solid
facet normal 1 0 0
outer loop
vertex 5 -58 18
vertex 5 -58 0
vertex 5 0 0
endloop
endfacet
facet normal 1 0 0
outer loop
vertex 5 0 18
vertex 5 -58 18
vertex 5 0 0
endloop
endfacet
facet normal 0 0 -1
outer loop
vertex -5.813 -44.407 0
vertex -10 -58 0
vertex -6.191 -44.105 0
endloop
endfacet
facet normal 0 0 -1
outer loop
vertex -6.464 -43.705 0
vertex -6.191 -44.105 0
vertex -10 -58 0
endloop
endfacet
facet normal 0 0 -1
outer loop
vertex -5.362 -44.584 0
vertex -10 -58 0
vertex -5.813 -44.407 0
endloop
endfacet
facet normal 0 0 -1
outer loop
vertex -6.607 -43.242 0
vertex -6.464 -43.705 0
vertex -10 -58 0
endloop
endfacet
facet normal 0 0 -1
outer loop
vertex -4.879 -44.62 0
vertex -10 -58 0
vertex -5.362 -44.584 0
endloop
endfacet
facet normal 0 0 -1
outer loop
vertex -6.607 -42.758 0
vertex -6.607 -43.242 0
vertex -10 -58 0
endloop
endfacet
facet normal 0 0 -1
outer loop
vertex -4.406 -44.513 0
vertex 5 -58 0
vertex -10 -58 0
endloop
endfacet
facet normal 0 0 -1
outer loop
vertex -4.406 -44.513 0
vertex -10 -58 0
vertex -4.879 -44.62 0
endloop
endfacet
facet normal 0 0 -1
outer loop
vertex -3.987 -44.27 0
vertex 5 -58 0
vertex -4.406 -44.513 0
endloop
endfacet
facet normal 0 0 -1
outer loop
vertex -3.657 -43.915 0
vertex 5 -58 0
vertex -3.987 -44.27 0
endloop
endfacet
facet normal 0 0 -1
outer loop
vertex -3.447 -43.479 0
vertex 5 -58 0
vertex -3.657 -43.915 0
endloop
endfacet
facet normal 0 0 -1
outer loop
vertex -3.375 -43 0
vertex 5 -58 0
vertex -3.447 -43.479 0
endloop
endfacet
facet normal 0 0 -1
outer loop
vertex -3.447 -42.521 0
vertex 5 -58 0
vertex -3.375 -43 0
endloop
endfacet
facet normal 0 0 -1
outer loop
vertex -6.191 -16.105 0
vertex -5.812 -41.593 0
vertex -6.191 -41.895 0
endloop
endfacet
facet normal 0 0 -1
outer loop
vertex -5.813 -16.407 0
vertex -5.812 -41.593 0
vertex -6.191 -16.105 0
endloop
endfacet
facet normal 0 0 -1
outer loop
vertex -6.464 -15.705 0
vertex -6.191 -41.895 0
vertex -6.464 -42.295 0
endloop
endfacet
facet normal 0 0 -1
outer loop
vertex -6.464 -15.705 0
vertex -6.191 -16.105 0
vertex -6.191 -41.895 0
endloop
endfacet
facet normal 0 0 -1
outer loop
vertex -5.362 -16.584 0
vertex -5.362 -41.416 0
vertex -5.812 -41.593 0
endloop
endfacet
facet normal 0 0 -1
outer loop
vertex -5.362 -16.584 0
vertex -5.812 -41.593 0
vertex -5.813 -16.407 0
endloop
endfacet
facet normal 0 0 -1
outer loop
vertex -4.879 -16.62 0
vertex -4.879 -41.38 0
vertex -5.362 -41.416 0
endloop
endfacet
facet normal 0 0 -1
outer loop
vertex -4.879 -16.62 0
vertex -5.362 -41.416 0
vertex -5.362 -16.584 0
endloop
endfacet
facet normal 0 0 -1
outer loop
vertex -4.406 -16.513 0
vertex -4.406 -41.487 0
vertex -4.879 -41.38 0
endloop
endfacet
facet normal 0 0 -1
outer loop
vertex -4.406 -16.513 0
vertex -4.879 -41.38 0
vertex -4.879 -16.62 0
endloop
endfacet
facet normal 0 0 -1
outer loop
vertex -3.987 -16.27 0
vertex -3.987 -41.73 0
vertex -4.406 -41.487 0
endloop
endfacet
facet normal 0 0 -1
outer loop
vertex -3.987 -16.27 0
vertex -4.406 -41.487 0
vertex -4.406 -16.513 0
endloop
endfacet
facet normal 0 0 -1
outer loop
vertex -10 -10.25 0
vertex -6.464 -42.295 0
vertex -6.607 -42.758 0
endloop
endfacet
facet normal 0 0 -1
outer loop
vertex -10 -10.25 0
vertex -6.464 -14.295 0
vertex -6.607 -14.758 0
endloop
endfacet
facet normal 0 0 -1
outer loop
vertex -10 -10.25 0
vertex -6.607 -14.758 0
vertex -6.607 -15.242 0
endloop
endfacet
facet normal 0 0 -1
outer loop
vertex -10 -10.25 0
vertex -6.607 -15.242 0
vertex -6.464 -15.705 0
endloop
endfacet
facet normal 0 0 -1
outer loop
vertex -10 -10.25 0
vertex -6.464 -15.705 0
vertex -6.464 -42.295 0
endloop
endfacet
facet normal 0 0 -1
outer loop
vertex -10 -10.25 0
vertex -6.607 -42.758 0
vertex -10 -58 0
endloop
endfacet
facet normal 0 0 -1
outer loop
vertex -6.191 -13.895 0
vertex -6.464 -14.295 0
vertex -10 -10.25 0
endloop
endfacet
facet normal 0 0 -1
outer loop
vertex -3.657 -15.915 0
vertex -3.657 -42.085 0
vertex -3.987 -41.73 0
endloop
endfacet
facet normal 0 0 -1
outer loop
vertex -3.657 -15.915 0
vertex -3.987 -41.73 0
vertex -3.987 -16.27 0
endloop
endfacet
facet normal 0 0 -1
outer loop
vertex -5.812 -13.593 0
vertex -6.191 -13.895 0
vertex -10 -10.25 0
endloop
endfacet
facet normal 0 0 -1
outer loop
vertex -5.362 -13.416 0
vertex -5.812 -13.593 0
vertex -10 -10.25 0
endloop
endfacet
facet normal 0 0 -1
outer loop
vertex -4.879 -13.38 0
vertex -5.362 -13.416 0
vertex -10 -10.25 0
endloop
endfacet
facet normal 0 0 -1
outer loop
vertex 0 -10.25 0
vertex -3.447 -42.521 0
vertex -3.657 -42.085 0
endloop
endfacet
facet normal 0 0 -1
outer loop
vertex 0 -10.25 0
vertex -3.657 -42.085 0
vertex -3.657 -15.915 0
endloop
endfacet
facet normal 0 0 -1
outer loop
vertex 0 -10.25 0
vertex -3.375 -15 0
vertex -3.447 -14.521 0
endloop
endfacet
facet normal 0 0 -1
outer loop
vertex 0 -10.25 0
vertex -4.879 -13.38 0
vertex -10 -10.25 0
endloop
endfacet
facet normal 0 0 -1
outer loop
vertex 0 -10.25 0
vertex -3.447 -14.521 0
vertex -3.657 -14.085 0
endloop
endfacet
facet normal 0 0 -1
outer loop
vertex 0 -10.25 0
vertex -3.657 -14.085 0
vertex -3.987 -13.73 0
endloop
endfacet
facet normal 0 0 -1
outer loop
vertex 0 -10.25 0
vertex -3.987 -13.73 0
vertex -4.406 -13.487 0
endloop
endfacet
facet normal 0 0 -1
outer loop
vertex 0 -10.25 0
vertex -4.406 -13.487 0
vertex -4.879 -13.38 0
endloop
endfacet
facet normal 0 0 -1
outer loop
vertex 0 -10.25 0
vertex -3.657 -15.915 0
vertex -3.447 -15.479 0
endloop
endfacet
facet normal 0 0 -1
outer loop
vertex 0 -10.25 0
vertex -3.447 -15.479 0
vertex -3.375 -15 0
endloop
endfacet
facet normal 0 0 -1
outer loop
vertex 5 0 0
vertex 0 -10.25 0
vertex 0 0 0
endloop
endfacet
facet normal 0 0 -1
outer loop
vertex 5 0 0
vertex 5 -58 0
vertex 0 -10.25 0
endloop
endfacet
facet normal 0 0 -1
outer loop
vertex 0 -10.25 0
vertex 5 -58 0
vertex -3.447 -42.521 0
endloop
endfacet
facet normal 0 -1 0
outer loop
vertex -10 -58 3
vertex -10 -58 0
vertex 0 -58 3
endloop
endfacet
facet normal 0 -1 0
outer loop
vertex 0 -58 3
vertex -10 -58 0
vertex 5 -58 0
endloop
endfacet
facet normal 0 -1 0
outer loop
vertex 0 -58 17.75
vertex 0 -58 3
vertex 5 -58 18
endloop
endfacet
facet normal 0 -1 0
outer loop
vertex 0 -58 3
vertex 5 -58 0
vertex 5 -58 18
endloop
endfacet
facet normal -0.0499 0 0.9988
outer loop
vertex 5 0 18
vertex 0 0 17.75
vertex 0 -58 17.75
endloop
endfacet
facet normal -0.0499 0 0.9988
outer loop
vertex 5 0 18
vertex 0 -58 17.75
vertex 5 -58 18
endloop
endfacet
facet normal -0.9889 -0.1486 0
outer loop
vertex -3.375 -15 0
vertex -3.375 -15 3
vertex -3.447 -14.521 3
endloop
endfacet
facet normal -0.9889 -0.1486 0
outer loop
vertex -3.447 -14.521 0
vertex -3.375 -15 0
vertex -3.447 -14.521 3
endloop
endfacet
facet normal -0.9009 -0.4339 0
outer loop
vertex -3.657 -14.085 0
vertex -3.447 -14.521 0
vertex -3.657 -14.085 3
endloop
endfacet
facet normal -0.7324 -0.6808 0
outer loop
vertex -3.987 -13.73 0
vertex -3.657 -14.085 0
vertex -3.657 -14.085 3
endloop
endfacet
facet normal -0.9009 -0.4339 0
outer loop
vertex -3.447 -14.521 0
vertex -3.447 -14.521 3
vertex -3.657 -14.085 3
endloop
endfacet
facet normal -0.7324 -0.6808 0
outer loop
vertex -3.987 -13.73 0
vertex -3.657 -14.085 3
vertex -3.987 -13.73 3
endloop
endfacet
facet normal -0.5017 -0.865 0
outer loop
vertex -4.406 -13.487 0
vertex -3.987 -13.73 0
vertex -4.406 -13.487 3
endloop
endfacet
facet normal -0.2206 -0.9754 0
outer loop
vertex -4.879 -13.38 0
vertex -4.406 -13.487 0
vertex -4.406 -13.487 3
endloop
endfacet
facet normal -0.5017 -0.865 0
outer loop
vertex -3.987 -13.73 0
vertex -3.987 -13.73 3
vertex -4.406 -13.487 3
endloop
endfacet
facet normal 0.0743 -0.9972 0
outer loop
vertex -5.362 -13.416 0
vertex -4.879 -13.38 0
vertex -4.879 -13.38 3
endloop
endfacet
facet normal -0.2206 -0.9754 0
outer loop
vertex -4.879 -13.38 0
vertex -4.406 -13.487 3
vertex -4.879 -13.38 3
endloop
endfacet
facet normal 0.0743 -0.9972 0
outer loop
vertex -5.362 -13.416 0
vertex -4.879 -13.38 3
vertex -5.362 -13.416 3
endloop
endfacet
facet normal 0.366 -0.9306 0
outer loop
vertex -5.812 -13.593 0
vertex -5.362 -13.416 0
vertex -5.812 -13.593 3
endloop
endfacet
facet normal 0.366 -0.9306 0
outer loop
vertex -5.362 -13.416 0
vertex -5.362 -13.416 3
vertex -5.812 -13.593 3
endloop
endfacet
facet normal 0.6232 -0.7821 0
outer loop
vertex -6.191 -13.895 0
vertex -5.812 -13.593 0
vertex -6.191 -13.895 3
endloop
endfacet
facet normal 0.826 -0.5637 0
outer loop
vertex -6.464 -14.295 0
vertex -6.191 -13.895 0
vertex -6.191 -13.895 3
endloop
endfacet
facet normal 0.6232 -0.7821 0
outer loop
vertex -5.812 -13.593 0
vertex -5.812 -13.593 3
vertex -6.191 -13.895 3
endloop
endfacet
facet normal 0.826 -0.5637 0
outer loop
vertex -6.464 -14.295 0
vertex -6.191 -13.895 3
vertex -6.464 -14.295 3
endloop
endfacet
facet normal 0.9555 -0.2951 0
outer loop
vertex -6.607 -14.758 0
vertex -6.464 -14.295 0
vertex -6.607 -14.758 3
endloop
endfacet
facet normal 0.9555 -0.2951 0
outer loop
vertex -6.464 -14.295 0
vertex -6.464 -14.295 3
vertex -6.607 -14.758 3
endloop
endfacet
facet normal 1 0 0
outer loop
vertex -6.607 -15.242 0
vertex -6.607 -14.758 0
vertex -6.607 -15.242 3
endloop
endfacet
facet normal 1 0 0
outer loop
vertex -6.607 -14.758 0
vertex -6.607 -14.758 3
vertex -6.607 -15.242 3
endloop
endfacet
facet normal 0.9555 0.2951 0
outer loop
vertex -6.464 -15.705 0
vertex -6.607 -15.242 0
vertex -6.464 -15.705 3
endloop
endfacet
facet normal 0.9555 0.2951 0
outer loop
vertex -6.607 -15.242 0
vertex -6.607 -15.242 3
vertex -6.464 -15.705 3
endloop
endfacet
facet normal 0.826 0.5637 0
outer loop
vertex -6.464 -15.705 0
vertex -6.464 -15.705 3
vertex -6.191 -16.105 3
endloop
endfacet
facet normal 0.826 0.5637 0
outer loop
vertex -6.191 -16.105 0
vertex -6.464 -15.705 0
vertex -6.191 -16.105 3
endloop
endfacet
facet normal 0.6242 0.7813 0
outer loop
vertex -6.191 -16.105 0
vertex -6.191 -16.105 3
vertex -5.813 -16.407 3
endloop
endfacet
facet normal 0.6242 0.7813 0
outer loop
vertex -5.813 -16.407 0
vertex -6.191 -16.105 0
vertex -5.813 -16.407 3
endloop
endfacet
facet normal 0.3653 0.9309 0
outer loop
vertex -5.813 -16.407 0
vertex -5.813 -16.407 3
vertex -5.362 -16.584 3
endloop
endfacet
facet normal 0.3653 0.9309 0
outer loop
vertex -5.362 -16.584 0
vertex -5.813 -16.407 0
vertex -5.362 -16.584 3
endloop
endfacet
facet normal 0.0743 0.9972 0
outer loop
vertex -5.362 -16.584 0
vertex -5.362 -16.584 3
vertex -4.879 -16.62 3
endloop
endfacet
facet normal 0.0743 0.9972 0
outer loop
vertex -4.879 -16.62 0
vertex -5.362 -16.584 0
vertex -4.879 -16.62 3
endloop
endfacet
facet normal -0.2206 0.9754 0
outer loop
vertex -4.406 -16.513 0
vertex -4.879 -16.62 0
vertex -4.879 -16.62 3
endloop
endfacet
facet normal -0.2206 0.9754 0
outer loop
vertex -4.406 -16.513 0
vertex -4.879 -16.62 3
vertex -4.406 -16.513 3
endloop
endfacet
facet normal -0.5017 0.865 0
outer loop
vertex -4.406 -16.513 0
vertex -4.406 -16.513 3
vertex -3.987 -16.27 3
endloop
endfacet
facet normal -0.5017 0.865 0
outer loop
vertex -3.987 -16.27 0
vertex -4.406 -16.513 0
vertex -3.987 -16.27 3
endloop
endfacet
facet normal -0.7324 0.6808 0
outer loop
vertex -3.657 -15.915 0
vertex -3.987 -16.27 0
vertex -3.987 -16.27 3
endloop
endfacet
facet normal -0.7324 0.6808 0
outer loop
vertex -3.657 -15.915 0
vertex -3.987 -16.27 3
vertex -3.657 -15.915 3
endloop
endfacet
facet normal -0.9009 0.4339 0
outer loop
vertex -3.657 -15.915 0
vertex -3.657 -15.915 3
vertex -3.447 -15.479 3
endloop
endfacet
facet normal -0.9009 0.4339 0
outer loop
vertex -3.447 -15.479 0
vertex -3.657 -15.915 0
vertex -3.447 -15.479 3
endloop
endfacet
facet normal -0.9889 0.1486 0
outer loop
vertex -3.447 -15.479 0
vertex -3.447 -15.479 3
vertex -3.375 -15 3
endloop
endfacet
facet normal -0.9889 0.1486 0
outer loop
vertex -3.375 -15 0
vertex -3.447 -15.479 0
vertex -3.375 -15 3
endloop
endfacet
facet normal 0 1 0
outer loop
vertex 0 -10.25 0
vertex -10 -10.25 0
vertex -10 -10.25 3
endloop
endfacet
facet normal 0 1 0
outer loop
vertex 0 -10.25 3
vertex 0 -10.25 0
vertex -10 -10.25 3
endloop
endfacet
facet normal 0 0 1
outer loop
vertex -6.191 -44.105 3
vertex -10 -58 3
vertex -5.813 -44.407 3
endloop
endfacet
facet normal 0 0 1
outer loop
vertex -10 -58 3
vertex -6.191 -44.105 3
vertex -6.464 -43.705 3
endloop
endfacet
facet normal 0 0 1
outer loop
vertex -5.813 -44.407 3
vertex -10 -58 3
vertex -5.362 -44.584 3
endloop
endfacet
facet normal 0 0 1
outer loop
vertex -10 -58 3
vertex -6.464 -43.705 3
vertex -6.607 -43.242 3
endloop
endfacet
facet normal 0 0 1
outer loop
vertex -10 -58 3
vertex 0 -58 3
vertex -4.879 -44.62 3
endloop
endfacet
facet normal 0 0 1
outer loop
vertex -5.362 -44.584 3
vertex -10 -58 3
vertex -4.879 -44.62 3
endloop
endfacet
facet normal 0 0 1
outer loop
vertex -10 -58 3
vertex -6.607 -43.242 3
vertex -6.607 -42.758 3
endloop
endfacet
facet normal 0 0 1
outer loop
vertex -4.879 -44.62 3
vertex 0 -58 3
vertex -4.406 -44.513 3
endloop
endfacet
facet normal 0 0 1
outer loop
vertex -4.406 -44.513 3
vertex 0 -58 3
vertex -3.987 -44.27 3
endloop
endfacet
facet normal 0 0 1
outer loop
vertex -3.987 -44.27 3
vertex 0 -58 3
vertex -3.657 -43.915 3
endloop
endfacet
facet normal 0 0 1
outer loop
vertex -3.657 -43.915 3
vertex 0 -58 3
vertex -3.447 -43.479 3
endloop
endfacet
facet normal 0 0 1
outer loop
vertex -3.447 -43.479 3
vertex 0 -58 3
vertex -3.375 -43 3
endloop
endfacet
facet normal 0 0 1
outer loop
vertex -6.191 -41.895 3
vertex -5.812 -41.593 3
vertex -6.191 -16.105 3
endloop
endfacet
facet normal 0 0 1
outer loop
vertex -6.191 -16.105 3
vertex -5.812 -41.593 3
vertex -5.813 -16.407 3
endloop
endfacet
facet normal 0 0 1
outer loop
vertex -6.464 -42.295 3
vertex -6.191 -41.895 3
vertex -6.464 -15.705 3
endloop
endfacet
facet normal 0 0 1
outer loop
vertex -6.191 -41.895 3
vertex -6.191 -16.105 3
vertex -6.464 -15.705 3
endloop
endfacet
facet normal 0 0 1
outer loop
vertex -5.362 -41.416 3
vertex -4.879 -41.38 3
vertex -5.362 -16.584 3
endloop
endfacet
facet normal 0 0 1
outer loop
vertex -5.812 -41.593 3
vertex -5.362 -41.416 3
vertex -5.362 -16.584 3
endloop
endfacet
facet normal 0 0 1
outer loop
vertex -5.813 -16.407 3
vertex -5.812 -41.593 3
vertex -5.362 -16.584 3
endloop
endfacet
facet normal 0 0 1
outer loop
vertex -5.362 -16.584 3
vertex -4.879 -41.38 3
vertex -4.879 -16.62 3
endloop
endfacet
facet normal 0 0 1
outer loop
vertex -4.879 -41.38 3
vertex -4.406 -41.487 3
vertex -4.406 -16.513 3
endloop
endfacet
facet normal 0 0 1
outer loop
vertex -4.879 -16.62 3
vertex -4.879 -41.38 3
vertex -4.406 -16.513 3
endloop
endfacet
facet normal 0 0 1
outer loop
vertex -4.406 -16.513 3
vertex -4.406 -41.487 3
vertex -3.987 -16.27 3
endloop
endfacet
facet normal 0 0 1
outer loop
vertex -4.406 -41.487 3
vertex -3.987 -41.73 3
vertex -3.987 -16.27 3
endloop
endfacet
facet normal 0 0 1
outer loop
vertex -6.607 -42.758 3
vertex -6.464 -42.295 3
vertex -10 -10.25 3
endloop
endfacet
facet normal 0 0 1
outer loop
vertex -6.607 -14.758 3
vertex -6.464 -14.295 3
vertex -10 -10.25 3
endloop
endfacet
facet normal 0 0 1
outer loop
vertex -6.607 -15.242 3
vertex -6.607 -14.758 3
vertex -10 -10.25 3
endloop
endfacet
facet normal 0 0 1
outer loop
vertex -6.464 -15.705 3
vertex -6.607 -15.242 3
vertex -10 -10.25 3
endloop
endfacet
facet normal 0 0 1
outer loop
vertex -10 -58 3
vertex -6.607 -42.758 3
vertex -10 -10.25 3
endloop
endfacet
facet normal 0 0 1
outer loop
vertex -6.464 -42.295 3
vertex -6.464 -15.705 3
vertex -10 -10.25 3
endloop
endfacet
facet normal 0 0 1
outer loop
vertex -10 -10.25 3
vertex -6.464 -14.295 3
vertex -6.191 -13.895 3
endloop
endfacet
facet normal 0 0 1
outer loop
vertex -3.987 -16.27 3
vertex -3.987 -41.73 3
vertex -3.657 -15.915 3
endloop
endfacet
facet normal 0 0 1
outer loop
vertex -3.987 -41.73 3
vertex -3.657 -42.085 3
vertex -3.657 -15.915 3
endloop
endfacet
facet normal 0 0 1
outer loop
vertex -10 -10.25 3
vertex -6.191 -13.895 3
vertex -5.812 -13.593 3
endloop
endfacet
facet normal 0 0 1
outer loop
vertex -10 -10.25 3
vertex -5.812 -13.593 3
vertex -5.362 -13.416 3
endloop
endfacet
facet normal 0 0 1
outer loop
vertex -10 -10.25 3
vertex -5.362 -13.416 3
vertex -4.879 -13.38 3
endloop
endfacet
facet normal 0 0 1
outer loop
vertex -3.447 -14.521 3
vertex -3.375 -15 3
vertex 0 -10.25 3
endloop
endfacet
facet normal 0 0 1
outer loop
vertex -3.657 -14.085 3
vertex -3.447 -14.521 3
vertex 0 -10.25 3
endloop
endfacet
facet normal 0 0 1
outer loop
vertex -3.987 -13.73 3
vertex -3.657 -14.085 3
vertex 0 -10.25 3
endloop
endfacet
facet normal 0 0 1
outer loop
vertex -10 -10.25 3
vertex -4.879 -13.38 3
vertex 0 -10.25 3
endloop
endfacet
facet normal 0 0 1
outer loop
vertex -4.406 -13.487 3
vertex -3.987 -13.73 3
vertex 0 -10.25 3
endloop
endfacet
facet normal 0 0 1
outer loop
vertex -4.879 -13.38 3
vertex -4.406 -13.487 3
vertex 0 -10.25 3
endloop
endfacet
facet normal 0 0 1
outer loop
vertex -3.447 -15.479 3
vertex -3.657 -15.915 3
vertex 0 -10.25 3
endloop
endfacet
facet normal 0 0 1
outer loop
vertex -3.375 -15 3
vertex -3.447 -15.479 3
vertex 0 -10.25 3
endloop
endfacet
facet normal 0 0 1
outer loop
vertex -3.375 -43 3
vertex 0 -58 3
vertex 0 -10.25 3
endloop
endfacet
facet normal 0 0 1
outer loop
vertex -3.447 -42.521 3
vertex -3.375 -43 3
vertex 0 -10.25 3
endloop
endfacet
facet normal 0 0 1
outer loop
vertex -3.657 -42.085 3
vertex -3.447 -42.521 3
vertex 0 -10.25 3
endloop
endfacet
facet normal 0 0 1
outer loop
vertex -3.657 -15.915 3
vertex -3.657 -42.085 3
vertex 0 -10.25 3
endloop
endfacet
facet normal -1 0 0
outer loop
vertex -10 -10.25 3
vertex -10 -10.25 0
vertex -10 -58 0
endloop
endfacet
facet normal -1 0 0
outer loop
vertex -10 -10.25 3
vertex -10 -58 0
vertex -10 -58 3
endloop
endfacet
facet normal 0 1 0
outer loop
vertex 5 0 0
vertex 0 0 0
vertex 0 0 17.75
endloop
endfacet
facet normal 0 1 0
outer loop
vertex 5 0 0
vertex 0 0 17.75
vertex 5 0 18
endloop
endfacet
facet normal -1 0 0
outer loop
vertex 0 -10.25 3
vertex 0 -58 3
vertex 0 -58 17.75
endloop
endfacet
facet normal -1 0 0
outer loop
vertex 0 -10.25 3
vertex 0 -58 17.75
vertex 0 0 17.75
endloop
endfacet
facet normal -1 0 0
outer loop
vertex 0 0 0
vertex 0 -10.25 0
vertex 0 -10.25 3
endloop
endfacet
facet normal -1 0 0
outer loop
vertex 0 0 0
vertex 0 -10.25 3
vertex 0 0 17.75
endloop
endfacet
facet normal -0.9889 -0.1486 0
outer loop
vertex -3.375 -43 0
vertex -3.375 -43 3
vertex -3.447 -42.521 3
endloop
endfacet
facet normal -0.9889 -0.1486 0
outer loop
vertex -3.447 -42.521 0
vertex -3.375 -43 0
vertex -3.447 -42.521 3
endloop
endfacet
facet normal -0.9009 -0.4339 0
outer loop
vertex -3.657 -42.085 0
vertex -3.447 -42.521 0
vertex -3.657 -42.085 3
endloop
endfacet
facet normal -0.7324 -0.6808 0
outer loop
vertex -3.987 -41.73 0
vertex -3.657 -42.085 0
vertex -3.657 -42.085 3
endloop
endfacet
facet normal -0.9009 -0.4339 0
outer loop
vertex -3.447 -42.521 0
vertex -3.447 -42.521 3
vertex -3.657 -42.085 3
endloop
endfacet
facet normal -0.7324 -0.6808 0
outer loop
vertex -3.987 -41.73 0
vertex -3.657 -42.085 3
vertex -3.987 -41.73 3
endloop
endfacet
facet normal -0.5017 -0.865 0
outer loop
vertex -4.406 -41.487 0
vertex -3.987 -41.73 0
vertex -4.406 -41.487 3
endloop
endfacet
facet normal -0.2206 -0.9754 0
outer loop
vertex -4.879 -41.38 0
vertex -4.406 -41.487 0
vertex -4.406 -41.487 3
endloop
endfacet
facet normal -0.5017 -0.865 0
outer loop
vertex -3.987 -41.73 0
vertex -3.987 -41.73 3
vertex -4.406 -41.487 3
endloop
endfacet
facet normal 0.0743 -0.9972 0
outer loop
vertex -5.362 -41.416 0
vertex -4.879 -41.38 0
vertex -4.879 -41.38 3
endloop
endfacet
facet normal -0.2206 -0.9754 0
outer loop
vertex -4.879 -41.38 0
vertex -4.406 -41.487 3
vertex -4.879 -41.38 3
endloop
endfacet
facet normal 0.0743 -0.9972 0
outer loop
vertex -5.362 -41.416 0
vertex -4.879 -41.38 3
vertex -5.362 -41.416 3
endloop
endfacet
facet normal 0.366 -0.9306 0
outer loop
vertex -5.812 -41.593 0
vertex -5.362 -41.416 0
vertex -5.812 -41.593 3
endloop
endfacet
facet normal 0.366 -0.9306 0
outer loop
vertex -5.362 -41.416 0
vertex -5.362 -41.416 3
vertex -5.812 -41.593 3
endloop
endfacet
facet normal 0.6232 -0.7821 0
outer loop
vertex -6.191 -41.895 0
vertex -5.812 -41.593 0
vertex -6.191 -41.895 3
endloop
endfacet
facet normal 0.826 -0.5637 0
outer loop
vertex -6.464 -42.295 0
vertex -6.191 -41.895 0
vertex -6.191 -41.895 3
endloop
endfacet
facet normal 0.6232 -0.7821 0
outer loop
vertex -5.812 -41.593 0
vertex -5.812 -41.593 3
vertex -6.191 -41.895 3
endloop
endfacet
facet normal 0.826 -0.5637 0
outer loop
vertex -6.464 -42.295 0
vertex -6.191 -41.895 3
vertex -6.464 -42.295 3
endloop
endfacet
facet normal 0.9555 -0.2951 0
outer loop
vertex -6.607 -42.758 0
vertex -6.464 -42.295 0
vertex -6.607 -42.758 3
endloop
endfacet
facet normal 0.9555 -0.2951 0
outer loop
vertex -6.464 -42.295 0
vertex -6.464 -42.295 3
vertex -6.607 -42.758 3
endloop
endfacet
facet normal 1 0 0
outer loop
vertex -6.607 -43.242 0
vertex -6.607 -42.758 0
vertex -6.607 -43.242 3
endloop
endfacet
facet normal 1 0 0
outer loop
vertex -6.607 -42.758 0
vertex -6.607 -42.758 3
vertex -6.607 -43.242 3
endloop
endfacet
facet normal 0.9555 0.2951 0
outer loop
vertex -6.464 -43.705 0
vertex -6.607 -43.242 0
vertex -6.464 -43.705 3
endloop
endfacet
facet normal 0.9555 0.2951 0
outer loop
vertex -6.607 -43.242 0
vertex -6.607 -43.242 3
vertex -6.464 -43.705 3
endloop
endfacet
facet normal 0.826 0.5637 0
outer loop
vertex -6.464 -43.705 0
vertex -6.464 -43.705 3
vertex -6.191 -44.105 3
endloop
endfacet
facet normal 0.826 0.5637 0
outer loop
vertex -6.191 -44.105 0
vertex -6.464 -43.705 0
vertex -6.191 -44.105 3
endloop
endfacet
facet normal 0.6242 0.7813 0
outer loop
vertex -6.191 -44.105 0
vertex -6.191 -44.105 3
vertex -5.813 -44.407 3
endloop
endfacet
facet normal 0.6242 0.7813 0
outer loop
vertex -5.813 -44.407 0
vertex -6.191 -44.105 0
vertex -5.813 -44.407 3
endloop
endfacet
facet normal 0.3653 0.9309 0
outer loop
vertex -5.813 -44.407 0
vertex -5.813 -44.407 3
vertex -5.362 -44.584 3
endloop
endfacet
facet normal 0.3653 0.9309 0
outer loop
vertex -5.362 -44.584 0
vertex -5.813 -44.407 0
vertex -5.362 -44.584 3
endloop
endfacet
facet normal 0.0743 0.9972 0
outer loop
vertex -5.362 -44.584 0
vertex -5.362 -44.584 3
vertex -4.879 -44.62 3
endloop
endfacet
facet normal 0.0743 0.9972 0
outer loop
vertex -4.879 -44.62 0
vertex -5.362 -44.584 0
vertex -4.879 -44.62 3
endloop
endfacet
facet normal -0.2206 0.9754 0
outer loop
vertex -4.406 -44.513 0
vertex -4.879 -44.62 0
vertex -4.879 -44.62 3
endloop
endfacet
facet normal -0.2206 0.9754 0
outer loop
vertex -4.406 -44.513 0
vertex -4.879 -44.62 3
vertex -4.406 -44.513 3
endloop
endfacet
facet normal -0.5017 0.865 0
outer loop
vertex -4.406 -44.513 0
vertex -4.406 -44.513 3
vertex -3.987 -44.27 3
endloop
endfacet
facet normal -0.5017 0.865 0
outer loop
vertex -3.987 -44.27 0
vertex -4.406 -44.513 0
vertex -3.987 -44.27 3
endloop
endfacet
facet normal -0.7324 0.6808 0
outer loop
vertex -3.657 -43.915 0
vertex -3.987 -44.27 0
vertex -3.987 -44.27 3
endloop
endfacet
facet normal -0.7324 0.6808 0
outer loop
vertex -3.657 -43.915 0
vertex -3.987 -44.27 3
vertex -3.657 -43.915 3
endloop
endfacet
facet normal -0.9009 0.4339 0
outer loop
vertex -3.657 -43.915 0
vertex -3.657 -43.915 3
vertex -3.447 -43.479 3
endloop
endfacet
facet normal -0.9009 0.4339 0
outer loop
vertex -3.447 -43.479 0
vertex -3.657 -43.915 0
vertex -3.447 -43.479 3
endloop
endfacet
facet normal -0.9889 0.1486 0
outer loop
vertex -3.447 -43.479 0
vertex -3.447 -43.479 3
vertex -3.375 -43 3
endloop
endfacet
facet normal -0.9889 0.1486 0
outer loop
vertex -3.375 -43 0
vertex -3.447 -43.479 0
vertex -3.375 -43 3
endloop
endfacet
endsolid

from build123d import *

# Parameters (mm, degrees)
ESQUISSE1_W             = 5
ESQUISSE1_H             = 58
BOSS_EXTRU_1_DEPTH      = 18
ESQUISSE2_W             = 3
ESQUISSE2_H             = 47.75
BOSS_EXTRU_2_DEPTH      = 10
ESQUISSE3_R             = 1.625
ENL_V_MAT_EXTRU_1_DEPTH = 4
ENL_V_MAT_EXTRU_2_DEPTH = 59


with BuildPart() as part:
    # Esquisse1 → Boss.-Extru.1 (new body)
    with BuildSketch(Plane.XY):
        with Locations((2.5, -29)):
            Rectangle(ESQUISSE1_W, ESQUISSE1_H)
    extrude(amount=BOSS_EXTRU_1_DEPTH)

    # Esquisse2 → Boss.-Extru.2 (add)
    with BuildSketch(Plane.ZY):
        with Locations((1.5, -34.125)):
            Rectangle(ESQUISSE2_W, ESQUISSE2_H)
    extrude(amount=BOSS_EXTRU_2_DEPTH)

    # Esquisse3 → Enlèv. mat.-Extru.1 (cut, through all)
    with BuildSketch(Plane.XY.offset(3)):
        with Locations((-5, -15)):
            Circle(ESQUISSE3_R)
        with Locations((-5, -43)):
            Circle(ESQUISSE3_R)
    extrude(amount=-ENL_V_MAT_EXTRU_1_DEPTH, mode=Mode.SUBTRACT)

    # Esquisse4 → Enlèv. mat.-Extru.2 (cut, through all)
    with BuildSketch(Plane.XZ.offset(58)):
        Polygon((0, 18), (0, 17.75), (5, 18), align=None)
    extrude(amount=-ENL_V_MAT_EXTRU_2_DEPTH, mode=Mode.SUBTRACT)


solid = part.part
